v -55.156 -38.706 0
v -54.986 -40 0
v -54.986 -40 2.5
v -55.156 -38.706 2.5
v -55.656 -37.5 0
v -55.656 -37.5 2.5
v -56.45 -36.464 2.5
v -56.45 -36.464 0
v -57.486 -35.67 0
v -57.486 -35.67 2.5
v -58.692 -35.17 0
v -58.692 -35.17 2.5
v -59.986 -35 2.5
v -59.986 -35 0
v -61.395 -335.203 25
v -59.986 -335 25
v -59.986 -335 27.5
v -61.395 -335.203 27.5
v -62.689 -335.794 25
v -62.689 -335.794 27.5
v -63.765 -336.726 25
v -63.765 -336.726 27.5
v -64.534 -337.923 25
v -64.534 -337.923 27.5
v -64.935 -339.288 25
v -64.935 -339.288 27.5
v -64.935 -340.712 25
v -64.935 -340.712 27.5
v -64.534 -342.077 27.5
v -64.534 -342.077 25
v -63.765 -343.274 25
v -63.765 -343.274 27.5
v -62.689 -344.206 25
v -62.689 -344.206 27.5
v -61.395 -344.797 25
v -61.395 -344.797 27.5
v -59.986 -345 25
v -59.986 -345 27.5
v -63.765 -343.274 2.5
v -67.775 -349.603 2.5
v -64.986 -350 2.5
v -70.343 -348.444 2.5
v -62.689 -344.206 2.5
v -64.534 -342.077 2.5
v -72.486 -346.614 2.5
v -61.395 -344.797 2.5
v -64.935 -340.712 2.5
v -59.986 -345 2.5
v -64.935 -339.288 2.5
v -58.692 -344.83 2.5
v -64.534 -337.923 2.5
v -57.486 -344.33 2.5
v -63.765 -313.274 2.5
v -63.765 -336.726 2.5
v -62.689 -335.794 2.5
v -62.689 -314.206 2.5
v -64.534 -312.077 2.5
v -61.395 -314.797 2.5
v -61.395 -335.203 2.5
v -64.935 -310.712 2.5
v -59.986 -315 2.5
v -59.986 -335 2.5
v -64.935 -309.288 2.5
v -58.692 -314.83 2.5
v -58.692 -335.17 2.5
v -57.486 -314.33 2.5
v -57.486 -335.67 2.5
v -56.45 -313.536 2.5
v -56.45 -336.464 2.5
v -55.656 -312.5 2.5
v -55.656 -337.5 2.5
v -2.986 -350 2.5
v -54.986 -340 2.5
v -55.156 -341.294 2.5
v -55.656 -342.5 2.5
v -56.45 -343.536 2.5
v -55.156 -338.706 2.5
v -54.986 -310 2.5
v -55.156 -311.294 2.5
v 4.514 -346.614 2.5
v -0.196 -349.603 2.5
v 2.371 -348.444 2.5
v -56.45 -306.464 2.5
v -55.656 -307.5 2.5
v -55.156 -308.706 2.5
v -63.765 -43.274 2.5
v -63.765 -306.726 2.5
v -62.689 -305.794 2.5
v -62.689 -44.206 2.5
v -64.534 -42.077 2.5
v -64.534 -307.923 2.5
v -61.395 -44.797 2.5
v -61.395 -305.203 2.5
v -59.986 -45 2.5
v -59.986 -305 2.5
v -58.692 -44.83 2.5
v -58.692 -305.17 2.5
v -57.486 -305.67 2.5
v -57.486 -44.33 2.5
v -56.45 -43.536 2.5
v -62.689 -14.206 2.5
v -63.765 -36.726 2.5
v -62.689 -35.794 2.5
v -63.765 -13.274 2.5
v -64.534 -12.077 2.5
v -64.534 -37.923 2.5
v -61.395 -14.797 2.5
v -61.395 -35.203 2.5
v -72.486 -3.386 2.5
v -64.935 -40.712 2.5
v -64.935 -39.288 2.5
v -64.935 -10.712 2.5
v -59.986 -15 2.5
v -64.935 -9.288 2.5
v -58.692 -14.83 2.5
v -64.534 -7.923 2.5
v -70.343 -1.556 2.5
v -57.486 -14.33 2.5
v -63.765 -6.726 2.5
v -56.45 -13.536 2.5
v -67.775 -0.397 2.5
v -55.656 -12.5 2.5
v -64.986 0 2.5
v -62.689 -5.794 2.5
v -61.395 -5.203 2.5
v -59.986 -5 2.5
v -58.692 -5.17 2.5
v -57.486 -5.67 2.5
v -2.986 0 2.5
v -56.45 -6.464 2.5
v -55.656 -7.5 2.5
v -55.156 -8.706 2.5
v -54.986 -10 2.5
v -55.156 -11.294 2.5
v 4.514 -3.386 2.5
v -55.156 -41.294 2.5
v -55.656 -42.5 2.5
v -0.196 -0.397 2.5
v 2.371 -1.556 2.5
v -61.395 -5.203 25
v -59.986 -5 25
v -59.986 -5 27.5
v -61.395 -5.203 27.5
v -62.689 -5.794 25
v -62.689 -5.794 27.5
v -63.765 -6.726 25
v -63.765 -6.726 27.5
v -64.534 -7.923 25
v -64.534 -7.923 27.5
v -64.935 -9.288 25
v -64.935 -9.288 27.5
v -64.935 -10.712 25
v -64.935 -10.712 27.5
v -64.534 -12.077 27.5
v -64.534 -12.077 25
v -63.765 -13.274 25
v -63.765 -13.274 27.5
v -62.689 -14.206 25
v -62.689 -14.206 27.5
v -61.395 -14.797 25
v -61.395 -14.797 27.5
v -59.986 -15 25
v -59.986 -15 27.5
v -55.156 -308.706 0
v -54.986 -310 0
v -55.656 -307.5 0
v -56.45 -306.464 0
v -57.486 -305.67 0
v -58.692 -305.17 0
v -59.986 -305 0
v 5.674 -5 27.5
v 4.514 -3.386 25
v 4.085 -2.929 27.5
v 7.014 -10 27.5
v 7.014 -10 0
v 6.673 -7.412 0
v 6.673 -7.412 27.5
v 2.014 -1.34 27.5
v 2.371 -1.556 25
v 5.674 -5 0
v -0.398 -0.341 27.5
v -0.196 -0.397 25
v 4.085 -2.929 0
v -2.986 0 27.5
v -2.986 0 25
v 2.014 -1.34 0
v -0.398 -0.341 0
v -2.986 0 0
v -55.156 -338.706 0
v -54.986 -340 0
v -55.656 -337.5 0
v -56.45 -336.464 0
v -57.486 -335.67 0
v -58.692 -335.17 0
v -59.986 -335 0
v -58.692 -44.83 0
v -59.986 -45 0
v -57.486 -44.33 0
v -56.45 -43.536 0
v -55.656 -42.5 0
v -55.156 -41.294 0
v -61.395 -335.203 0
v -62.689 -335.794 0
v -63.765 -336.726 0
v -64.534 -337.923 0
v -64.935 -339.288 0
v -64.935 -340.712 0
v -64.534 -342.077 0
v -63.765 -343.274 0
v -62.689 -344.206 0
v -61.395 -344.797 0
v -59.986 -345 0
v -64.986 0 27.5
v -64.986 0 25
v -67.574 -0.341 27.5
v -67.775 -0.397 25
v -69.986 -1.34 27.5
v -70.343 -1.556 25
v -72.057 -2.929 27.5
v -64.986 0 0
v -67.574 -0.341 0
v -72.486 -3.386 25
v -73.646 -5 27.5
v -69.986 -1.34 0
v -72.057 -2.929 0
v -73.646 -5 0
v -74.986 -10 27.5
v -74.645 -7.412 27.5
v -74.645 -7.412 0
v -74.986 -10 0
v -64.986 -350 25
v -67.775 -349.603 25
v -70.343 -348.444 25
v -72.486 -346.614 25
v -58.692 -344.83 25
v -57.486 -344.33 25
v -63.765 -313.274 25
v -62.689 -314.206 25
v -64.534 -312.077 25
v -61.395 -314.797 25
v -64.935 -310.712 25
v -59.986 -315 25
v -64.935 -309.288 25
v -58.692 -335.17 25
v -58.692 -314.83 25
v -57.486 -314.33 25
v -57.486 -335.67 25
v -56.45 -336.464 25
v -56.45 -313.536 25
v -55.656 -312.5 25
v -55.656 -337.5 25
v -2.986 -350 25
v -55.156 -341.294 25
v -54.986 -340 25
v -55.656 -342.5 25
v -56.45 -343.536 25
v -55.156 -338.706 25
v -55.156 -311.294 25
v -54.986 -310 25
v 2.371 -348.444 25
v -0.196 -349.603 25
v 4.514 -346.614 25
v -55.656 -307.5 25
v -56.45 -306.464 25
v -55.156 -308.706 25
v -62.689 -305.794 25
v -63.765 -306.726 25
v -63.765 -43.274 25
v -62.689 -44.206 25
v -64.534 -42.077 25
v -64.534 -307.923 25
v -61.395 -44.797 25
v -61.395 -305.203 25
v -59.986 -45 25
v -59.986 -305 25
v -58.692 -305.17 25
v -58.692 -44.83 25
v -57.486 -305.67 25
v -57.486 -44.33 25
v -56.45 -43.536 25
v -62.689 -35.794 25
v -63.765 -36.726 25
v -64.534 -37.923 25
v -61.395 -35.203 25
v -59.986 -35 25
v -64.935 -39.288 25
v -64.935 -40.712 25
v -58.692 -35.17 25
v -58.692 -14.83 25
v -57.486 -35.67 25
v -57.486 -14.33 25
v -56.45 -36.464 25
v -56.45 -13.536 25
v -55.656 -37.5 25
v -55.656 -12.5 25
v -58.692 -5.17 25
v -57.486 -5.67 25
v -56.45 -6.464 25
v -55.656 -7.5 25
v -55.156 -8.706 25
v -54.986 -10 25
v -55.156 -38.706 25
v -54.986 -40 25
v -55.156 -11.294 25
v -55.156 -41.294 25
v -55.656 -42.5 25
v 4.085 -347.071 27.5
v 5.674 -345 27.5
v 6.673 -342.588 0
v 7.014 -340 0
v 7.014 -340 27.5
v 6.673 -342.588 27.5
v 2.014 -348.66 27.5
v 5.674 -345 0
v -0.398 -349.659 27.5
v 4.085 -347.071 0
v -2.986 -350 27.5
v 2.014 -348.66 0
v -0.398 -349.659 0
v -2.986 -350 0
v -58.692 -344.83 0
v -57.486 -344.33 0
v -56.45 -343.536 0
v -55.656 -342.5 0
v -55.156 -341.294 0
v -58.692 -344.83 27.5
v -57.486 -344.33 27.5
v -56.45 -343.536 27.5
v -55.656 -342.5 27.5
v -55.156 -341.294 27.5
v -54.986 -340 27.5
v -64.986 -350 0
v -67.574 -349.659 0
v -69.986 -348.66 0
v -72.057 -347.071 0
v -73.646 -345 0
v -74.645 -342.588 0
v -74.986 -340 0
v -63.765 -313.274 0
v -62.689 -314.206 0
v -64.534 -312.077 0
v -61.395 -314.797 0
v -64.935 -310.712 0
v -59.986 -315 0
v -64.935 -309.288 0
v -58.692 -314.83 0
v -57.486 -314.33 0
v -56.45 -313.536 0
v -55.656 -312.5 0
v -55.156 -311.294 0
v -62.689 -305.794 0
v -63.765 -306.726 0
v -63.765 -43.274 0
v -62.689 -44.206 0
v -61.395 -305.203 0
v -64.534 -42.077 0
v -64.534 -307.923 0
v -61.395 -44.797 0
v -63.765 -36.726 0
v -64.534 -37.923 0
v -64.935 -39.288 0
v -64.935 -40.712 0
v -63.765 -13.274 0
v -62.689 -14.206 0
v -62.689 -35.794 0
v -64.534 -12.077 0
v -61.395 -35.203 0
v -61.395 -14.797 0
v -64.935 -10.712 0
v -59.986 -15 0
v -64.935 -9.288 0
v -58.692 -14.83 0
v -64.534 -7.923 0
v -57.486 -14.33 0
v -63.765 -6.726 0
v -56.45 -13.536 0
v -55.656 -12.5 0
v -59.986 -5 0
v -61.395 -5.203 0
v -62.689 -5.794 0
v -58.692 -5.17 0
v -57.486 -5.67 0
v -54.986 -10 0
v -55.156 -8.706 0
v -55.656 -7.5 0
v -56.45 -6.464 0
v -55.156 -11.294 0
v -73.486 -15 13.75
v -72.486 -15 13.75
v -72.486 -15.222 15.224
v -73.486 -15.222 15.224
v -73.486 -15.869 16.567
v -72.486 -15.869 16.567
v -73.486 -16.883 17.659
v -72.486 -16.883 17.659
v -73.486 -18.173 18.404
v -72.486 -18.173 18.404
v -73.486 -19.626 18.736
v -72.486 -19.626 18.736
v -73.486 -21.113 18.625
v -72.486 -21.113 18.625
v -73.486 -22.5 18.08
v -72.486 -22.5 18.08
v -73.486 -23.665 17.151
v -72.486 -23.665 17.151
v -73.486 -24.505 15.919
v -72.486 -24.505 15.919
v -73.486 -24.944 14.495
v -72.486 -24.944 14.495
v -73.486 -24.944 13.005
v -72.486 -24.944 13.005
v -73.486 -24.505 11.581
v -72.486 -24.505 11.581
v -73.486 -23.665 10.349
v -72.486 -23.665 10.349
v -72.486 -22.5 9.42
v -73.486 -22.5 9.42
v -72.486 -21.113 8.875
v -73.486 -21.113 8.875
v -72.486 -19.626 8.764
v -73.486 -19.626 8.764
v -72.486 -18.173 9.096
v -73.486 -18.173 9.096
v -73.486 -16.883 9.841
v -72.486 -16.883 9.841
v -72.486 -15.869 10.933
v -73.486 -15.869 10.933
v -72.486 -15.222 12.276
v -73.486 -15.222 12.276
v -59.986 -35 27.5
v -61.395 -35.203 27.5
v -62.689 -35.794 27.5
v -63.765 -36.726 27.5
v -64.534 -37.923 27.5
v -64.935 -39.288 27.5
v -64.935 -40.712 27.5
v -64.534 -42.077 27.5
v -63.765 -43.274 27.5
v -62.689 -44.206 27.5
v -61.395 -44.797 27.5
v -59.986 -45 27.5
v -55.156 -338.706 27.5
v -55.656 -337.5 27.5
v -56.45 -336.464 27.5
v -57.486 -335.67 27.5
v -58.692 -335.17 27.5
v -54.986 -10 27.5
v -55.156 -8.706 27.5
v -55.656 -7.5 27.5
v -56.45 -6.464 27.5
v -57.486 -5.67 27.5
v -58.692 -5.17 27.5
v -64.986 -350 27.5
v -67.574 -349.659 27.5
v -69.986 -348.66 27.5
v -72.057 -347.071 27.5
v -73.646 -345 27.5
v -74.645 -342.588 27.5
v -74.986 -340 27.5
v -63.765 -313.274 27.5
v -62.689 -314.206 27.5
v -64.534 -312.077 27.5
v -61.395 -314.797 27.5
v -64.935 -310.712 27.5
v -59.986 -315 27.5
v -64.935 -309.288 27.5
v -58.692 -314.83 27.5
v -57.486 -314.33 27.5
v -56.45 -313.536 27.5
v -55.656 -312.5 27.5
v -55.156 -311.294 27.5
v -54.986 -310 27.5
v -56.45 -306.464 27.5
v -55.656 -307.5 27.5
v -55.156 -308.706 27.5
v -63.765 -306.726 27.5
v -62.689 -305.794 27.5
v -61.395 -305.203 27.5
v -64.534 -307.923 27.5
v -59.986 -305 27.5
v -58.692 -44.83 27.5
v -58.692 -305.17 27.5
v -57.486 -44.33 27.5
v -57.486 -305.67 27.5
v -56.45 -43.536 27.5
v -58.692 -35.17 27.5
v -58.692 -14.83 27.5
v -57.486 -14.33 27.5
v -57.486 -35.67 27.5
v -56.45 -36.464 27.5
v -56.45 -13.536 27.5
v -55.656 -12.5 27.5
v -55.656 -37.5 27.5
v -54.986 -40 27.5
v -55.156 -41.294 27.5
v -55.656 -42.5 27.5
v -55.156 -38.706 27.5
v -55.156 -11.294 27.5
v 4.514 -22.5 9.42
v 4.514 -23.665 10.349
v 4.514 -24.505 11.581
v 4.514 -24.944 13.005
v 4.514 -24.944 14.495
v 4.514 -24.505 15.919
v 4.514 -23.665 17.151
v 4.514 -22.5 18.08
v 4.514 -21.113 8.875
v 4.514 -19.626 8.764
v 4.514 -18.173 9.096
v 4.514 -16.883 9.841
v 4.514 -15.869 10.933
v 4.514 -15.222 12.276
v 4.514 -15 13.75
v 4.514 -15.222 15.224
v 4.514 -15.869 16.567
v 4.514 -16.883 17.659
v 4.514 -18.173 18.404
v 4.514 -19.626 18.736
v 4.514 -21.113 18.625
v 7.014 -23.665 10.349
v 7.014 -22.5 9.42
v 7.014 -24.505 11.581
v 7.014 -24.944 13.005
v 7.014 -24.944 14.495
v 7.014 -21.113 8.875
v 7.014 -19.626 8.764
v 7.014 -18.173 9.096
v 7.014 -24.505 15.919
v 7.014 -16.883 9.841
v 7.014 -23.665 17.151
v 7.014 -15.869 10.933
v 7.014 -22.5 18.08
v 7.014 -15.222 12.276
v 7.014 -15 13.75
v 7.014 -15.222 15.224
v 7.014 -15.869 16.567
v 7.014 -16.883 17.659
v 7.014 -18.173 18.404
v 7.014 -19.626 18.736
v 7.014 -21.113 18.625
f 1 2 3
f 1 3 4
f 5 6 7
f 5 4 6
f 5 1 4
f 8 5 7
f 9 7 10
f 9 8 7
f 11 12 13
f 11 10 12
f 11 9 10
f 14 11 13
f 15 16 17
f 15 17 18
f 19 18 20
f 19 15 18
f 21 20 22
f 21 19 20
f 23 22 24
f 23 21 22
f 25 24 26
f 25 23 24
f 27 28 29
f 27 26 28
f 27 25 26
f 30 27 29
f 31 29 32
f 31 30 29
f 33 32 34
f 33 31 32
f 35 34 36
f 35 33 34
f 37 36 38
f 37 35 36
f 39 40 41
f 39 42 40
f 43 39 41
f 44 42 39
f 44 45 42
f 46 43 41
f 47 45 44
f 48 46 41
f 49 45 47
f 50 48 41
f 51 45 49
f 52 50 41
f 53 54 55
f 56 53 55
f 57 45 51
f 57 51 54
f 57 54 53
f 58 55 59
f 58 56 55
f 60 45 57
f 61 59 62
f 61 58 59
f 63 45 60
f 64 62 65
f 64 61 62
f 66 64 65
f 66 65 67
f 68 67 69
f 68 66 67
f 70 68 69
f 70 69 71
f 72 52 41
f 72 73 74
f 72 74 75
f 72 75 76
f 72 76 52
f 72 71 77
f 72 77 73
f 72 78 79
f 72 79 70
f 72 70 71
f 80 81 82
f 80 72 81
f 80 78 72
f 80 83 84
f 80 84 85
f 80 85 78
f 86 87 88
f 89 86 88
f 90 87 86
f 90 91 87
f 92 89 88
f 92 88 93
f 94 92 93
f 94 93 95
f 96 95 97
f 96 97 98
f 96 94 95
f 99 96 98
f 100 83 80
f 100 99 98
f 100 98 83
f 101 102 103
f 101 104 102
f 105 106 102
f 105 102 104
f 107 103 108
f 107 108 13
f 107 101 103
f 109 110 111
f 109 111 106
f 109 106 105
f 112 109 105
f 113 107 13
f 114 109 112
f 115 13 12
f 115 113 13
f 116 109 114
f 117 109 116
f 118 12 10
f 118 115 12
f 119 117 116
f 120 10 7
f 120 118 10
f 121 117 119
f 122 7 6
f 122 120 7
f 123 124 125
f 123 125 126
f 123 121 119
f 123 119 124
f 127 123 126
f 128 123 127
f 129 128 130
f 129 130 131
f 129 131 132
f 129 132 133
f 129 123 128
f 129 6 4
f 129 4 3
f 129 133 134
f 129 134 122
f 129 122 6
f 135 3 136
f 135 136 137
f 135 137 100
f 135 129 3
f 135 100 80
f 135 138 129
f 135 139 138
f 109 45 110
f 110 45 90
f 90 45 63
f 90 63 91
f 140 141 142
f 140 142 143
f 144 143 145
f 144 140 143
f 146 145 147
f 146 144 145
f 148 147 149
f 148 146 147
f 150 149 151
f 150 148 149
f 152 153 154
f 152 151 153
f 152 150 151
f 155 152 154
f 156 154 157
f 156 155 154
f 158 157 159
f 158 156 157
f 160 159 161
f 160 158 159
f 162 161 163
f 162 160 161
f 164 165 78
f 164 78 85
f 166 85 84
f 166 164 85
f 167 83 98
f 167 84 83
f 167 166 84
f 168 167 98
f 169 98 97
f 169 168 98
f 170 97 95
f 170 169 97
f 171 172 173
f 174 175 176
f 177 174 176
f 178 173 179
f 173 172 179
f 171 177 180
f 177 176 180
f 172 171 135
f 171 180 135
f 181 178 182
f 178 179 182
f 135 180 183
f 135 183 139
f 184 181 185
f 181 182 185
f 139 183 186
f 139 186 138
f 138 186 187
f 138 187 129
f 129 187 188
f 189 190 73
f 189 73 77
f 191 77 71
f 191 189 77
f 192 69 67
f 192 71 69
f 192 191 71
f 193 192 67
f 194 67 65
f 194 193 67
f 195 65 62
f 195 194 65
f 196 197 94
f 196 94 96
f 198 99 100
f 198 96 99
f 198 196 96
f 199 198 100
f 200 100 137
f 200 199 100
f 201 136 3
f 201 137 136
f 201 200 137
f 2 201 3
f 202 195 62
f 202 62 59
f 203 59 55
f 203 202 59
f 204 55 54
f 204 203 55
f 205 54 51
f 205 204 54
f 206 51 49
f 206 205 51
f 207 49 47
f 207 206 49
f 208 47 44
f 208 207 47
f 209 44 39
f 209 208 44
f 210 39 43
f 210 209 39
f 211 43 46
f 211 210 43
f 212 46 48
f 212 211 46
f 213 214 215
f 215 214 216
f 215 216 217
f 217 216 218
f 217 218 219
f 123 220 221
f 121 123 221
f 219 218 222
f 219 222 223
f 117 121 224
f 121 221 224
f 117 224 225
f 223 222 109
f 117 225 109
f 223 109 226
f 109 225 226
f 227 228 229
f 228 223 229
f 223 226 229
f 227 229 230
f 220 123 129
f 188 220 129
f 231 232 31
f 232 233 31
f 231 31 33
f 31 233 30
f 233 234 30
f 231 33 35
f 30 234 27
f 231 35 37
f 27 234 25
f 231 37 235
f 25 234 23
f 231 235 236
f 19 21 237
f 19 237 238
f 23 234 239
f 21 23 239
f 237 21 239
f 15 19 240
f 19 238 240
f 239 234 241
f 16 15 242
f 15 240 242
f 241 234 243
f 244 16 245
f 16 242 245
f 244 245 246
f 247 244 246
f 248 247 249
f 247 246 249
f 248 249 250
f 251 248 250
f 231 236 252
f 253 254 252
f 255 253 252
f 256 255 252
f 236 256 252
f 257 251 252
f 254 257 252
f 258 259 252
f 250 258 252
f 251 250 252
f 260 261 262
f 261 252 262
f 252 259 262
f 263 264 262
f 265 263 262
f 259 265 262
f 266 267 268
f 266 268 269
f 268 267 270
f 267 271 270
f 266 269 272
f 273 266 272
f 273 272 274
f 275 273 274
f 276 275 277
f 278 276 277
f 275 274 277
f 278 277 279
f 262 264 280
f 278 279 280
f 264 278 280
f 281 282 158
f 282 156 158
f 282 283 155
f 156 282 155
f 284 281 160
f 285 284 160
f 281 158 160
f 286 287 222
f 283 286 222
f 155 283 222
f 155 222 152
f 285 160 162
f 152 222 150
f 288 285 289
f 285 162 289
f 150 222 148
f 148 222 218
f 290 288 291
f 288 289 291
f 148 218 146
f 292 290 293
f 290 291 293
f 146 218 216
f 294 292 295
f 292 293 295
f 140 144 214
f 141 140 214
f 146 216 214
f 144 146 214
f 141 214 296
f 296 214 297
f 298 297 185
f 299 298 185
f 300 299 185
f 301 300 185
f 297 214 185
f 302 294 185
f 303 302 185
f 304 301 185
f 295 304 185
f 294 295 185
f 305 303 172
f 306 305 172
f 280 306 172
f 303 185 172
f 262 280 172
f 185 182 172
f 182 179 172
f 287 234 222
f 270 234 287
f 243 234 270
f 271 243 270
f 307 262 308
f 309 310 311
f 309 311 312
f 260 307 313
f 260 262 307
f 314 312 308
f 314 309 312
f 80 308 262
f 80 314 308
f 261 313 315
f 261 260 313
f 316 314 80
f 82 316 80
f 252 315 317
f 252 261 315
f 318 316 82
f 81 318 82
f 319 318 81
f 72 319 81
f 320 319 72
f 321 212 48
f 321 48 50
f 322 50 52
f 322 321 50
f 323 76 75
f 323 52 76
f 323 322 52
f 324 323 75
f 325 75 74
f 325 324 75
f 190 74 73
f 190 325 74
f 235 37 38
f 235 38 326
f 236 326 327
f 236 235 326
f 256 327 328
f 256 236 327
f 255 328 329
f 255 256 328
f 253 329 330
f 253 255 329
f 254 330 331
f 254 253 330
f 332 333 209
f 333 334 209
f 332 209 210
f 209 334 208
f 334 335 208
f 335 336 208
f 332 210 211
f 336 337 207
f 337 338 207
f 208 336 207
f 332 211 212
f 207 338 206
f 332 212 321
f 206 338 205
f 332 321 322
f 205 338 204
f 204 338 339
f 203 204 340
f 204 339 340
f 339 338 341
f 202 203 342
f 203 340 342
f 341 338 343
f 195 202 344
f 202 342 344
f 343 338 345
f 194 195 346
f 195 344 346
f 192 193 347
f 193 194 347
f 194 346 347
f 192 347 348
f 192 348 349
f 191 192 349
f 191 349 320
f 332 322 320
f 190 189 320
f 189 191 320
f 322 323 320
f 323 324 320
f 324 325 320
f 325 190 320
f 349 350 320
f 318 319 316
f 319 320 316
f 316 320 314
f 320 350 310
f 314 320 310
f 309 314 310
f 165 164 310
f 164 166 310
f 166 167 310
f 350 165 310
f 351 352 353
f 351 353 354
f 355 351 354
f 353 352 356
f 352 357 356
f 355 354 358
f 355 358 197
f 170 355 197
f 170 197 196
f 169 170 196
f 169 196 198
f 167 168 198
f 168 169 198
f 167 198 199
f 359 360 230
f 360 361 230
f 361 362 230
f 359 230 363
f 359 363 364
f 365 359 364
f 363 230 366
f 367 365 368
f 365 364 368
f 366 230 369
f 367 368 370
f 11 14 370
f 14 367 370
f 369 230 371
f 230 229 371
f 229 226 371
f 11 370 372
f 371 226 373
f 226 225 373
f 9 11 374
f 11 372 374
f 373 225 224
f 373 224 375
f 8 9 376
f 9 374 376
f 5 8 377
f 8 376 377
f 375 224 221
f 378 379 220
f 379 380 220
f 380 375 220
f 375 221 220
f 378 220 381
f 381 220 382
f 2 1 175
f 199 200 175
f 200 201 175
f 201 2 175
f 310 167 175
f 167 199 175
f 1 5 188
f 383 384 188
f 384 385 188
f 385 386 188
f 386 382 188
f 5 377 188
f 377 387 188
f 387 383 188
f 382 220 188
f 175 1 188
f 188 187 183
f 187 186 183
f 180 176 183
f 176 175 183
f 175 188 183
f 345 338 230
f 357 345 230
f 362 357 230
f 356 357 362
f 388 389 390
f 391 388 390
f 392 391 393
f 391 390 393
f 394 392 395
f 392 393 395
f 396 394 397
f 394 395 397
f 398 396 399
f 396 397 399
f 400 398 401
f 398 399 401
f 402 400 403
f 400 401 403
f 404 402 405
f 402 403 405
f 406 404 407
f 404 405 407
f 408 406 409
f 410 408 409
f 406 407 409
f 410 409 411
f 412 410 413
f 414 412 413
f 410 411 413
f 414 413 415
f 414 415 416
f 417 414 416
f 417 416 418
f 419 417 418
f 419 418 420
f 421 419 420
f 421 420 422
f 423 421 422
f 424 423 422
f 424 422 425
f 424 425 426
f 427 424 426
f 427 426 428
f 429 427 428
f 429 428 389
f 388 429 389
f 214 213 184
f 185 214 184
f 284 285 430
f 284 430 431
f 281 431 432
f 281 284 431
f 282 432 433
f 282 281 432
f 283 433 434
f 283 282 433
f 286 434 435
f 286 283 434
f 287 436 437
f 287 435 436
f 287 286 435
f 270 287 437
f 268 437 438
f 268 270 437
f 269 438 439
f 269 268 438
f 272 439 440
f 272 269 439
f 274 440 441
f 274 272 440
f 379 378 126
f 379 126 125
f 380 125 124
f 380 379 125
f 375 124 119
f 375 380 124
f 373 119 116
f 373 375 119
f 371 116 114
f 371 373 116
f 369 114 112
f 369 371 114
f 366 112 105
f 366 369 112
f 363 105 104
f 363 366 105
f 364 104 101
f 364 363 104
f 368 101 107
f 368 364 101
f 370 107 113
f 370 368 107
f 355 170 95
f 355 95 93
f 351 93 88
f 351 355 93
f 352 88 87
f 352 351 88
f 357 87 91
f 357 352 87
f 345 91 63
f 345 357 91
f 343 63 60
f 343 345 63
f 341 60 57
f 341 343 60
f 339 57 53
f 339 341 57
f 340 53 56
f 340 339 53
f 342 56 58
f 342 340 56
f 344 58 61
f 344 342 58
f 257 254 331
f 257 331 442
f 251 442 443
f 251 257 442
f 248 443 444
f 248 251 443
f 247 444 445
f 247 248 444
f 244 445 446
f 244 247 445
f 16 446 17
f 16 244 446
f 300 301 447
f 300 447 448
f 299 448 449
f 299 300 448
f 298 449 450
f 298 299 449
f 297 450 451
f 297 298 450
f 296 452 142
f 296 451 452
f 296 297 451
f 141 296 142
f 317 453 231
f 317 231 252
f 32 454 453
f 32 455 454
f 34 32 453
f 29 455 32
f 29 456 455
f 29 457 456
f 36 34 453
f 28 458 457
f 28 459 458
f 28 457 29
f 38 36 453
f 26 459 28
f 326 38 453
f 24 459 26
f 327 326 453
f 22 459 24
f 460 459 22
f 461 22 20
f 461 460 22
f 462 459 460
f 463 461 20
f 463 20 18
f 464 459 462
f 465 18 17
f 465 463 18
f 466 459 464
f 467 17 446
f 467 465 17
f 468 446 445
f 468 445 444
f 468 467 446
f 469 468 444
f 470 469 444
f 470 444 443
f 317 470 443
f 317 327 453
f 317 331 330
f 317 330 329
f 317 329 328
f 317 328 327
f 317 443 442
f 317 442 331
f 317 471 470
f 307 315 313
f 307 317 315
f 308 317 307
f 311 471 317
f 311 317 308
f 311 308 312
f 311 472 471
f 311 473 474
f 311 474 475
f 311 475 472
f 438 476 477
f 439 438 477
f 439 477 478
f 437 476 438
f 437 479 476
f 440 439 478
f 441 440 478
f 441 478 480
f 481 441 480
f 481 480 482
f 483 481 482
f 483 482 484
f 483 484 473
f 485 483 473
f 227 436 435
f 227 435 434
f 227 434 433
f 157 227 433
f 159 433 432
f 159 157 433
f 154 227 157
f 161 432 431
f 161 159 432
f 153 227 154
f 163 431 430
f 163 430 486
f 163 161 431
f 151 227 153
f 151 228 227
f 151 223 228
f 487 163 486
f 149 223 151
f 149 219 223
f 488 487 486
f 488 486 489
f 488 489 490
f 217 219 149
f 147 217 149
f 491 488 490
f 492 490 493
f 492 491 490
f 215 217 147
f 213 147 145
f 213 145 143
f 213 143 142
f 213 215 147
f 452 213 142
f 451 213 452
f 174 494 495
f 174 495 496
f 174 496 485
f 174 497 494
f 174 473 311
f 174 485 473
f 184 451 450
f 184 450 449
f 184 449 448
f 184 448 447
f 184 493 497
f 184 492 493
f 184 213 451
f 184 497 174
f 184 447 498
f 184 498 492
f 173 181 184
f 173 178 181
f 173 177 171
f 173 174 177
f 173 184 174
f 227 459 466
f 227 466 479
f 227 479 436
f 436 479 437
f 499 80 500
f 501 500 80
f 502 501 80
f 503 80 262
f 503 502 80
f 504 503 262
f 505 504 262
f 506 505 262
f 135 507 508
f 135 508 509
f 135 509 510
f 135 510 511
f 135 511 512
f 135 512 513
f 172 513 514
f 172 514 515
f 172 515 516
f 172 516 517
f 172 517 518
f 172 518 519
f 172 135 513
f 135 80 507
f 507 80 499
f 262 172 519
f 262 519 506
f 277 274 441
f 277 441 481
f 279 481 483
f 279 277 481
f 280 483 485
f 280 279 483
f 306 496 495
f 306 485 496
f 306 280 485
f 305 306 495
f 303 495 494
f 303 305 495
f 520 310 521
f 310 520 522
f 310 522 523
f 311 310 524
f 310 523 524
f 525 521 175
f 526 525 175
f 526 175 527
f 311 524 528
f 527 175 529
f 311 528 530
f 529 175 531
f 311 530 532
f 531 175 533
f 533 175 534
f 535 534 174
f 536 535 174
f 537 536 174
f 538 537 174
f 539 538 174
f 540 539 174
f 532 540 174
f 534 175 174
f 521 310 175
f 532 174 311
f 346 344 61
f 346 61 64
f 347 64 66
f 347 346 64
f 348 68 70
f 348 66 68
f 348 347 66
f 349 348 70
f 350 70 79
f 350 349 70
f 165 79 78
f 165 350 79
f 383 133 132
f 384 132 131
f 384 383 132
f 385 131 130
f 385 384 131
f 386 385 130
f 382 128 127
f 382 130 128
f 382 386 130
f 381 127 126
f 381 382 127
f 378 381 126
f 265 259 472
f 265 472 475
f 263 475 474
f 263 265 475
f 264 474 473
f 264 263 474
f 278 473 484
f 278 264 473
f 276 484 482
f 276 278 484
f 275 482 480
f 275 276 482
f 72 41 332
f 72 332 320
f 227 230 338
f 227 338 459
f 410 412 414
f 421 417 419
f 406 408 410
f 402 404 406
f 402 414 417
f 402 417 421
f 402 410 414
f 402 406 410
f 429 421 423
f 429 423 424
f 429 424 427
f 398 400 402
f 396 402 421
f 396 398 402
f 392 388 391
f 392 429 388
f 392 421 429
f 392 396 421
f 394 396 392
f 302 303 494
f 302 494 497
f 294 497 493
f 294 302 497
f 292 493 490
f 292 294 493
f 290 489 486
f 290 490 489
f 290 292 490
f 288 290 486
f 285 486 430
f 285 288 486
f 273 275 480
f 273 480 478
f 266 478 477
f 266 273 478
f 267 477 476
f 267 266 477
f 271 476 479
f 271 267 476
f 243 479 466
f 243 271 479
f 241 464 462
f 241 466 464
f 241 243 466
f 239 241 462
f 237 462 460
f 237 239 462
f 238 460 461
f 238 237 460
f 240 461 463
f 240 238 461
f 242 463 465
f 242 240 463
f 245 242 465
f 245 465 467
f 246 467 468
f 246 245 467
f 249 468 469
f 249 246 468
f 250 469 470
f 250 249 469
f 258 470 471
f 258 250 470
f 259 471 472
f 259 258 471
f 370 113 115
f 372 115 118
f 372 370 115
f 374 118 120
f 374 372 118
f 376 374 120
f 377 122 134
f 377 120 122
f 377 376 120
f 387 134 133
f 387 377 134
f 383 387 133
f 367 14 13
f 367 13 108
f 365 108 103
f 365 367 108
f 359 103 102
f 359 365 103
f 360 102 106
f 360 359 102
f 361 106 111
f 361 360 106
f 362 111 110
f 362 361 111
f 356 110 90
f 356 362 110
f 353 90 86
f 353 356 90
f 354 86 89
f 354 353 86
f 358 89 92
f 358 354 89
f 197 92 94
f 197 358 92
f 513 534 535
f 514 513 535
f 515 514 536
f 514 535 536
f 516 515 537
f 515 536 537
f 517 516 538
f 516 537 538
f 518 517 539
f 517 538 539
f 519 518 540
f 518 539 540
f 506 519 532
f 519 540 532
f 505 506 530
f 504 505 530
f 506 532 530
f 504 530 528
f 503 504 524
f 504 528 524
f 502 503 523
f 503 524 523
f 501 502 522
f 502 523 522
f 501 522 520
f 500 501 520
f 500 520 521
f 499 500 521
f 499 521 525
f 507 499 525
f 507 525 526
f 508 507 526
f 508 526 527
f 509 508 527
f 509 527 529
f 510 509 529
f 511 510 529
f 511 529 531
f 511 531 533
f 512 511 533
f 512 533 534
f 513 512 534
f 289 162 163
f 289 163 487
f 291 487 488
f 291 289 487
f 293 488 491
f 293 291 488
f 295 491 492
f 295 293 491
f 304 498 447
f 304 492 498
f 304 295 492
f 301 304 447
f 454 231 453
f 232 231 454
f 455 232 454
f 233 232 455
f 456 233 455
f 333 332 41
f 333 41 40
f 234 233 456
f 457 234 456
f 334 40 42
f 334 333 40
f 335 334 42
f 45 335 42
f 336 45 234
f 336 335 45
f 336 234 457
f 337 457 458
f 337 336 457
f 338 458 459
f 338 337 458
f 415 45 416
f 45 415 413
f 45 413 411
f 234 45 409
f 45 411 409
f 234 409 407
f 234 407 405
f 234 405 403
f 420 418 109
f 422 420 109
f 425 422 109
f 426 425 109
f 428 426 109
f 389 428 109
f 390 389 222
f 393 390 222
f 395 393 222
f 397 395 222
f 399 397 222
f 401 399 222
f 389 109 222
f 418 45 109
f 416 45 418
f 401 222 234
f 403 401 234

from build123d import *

# Parameters (mm, degrees)
F0_W        = 82
F0_H        = 27.5
F0_W_2      = 77
F0_H_2      = 22.5
F1_DEPTH    = 350
F3_DEPTH    = 53
F4_T1_DEPTH = 77.5
F5_R        = 5
F6_DEPTH    = 80.5


# Not quite as in the source:
# - a fillet or chamfer that OpenCascade refuses, or shapes differently, is made with other operations: its cross-section is extruded or revolved along the edge and cut away or added
# - a feature names something its author has since deleted; it is built from what else it names


with BuildPart() as f1:
    # F0 (on Front) → F1 (new body)
    with BuildSketch(Plane.XZ):
        with Locations((-33.9858543277, 13.75)):
            Rectangle(F0_W, F0_H)
        with Locations((-33.9858543277, 13.75)):
            Rectangle(F0_W_2, F0_H_2, mode=Mode.SUBTRACT)
    extrude(amount=F1_DEPTH)

    # F2 (on Top) → F3 (cut)
    with BuildSketch(Plane.XY):
        with BuildLine():
            Line((-59.9858543277, -340), (-59.9858543277, -335))
            ThreePointArc((-59.9858543277, -335), (-64.9858543277, -340), (-59.9858543277, -345))
            Line((-59.9858543277, -345), (-59.9858543277, -340))
        make_face()
        with BuildLine():
            ThreePointArc((-54.9858543277, -340), (-56.4503204217, -336.4644660941), (-59.9858543277, -335))
            Line((-59.9858543277, -335), (-59.9858543277, -340))
            Line((-59.9858543277, -340), (-59.9858543277, -345))
            ThreePointArc((-59.9858543277, -345), (-56.4503204217, -343.5355339059), (-54.9858543277, -340))
        make_face()
        with BuildLine():
            Line((-59.9858543277, -45), (-59.9858543277, -35))
            ThreePointArc((-59.9858543277, -35), (-64.9858543277, -40), (-59.9858543277, -45))
        make_face()
        with BuildLine():
            ThreePointArc((-54.9858543277, -40), (-56.4503204217, -36.4644660941), (-59.9858543277, -35))
            Line((-59.9858543277, -35), (-59.9858543277, -45))
            ThreePointArc((-59.9858543277, -45), (-56.4503204217, -43.5355339059), (-54.9858543277, -40))
        make_face()
        with BuildLine():
            Line((-59.9858543277, -15), (-59.9858543277, -5))
            ThreePointArc((-59.9858543277, -5), (-64.9858543277, -10), (-59.9858543277, -15))
        make_face()
        with BuildLine():
            ThreePointArc((-59.9858543277, -15), (-56.4503204217, -13.5355339059), (-54.9858543277, -10))
            ThreePointArc((-54.9858543277, -10), (-56.4503204217, -6.4644660941), (-59.9858543277, -5))
            Line((-59.9858543277, -5), (-59.9858543277, -15))
        make_face()
        with BuildLine():
            Line((-59.9858543277, -315), (-59.9858543277, -305))
            ThreePointArc((-59.9858543277, -305), (-64.9858543277, -310), (-59.9858543277, -315))
        make_face()
        with BuildLine():
            ThreePointArc((-54.9858543277, -310), (-56.4503204217, -306.4644660941), (-59.9858543277, -305))
            Line((-59.9858543277, -305), (-59.9858543277, -315))
            ThreePointArc((-59.9858543277, -315), (-56.4503204217, -313.5355339059), (-54.9858543277, -310))
        make_face()
    extrude(amount=F3_DEPTH, mode=Mode.SUBTRACT)

    # F4: fillet of radius 10 on 4 edges, made by hand

    # F4_s2 → F4_t1 (cut)
    with BuildSketch(Plane.XY.offset(-25)):
        with BuildLine():
            ThreePointArc((-64.9858543277, 0), (-72.0569221395, -2.9289321881), (-74.9858543277, -10))
            Line((-74.9858543277, -10), (-74.9858543277, 0))
            Line((-74.9858543277, 0), (-64.9858543277, 0))
        make_face()
        with BuildLine():
            ThreePointArc((-64.9858543277, -350), (-72.0569221395, -347.0710678119), (-74.9858543277, -340))
            Line((-74.9858543277, -340), (-74.9858543277, -350))
            Line((-74.9858543277, -350), (-64.9858543277, -350))
        make_face()
        with BuildLine():
            ThreePointArc((7.0141456723, -10), (4.0852134842, -2.9289321881), (-2.9858543277, 0))
            Line((-2.9858543277, 0), (7.0141456723, 0))
            Line((7.0141456723, 0), (7.0141456723, -10))
        make_face()
        with BuildLine():
            ThreePointArc((7.0141456723, -340), (4.0852134842, -347.0710678119), (-2.9858543277, -350))
            Line((-2.9858543277, -350), (7.0141456723, -350))
            Line((7.0141456723, -350), (7.0141456723, -340))
        make_face()
    extrude(amount=F4_T1_DEPTH, mode=Mode.SUBTRACT)

    # F5 (on face) → F6 (cut)
    with BuildSketch(Plane.YZ.offset(7.0141456723)):
        with Locations((-20, 13.75)):
            Circle(F5_R)
    extrude(amount=-F6_DEPTH, mode=Mode.SUBTRACT)


solid = f1.part
